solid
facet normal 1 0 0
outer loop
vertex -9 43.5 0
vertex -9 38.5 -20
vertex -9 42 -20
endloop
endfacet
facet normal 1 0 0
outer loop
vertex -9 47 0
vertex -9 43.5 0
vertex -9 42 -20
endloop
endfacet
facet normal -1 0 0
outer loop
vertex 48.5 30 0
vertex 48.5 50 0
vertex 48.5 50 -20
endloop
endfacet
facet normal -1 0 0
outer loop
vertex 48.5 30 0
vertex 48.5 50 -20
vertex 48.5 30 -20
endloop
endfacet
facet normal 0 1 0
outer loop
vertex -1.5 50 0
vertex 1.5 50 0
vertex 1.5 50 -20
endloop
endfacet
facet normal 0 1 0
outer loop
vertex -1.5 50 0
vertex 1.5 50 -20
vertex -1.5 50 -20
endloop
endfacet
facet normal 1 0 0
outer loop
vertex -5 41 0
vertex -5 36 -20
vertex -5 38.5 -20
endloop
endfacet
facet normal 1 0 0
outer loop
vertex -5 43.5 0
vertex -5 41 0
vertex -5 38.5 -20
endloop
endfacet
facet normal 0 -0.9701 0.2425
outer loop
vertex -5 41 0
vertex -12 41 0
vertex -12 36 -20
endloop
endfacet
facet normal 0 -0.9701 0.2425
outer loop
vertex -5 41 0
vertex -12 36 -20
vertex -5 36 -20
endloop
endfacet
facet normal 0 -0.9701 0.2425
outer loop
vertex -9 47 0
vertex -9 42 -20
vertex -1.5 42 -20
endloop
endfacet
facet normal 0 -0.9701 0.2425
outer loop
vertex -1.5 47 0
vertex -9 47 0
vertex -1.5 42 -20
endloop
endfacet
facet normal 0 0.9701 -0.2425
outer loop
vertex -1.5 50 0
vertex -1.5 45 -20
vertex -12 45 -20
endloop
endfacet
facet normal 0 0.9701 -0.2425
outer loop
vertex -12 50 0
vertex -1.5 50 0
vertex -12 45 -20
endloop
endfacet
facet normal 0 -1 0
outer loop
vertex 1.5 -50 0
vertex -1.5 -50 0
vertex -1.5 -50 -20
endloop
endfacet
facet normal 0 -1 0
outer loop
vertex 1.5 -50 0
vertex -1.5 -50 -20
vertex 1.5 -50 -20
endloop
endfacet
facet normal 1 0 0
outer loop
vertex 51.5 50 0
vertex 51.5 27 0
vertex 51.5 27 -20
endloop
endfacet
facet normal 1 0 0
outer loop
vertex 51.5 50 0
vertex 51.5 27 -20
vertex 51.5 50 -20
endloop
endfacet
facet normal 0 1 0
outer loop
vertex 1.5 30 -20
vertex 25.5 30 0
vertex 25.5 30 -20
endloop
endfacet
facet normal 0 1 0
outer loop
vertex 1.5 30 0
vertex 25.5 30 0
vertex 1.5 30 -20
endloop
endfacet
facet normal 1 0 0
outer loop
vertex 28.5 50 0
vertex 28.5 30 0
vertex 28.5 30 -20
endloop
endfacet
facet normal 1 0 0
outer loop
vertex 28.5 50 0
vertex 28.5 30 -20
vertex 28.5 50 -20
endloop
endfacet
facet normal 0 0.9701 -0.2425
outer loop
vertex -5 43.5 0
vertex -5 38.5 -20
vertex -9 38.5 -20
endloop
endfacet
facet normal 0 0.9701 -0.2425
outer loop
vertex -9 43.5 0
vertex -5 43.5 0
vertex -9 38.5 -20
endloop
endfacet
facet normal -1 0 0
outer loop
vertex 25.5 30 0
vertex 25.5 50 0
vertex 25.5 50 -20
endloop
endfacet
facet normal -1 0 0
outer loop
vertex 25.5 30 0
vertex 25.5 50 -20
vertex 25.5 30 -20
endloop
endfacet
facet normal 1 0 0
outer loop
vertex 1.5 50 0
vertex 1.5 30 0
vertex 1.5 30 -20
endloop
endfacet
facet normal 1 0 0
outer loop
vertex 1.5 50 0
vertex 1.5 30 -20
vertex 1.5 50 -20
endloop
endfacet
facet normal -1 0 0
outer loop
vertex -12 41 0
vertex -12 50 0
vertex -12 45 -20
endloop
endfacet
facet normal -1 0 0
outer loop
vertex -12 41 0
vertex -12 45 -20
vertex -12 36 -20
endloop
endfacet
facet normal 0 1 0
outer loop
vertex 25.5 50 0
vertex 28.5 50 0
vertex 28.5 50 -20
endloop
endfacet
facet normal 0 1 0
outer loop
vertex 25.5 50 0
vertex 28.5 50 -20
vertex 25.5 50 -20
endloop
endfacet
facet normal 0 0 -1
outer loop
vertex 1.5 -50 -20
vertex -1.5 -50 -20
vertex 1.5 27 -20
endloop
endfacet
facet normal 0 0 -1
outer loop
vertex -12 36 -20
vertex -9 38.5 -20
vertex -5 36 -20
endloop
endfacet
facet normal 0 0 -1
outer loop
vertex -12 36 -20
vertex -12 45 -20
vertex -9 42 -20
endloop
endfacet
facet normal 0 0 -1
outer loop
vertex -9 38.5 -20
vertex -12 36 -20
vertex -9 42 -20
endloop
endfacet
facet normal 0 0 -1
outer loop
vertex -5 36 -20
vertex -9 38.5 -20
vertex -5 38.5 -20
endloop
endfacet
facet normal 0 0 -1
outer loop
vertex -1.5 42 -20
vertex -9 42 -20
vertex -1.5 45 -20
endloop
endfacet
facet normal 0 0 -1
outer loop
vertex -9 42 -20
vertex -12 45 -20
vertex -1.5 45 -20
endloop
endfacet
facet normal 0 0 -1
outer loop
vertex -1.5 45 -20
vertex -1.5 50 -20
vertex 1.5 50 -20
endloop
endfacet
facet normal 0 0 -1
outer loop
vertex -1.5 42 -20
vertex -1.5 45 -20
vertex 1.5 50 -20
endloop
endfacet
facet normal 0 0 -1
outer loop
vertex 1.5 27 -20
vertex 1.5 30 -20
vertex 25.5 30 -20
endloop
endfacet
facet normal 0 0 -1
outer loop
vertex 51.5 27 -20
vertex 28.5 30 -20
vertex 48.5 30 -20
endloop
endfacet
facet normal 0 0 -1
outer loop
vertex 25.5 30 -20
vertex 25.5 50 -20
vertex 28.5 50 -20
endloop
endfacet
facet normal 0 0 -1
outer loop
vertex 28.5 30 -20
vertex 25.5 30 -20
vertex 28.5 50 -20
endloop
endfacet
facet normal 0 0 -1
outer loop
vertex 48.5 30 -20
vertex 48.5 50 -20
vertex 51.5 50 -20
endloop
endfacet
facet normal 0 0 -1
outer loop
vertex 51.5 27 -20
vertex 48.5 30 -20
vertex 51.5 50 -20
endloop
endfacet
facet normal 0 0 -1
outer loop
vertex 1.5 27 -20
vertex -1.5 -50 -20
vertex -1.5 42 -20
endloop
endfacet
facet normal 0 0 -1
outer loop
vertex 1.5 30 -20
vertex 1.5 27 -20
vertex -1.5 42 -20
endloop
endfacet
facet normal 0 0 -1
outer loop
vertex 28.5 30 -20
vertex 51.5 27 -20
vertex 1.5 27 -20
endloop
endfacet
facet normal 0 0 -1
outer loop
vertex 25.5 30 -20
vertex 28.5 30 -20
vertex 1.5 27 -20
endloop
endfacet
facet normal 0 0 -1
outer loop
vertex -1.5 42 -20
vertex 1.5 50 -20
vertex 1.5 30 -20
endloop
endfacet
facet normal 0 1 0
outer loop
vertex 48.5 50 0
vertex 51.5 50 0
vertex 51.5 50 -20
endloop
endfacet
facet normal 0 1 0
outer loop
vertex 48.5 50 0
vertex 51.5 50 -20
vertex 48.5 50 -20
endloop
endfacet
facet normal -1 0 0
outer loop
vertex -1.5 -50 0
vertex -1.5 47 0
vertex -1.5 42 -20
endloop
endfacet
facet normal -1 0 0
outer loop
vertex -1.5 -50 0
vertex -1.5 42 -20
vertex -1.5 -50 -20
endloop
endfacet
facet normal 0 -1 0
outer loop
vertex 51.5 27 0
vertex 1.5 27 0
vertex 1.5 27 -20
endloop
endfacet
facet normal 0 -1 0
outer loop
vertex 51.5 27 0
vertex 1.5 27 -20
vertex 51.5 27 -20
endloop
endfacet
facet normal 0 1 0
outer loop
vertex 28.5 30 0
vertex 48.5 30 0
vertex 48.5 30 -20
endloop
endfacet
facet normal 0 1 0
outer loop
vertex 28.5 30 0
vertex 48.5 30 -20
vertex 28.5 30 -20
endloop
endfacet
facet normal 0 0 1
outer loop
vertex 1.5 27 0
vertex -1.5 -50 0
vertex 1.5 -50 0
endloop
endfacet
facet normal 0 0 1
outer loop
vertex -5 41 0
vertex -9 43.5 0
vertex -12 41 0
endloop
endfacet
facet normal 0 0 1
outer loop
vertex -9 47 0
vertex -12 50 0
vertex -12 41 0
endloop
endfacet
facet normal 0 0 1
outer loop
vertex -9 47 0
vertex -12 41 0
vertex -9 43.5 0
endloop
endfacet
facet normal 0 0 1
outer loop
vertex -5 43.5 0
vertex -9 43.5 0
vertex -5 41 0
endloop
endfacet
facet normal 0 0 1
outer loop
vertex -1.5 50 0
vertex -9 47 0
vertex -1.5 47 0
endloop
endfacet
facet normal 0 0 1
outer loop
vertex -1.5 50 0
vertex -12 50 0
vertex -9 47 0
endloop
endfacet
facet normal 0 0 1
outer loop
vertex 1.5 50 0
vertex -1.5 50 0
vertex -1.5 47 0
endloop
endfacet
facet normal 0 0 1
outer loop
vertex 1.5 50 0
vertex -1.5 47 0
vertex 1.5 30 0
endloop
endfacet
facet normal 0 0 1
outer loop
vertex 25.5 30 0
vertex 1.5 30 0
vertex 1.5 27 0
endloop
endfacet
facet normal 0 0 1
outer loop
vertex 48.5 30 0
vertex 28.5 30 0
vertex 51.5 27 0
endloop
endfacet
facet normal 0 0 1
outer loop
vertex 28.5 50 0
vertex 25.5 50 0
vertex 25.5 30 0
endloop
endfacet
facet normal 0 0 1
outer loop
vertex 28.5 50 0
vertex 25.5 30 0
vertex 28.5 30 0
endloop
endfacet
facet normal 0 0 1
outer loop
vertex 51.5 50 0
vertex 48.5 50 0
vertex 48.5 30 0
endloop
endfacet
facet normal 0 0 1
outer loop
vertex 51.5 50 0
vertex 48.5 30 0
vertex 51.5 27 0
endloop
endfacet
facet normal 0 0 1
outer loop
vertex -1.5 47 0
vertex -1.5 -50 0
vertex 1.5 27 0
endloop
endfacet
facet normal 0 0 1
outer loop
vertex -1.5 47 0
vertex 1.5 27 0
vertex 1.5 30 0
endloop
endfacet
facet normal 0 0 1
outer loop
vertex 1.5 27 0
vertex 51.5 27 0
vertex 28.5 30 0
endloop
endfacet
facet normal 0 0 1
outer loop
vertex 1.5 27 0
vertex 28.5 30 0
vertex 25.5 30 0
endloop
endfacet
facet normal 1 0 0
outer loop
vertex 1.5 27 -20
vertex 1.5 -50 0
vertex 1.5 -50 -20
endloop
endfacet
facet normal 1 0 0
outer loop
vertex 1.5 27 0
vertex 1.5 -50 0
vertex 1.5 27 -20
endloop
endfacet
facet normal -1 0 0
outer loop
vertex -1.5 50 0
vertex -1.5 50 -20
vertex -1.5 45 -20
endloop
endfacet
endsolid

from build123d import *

# Parameters (mm, degrees)
F1_DEPTH = 20


with BuildPart() as f1:
    # F0 (on Top) → F1 (new body)
    with BuildSketch(Plane.XY):
        Polygon((1.5, 50), (-1.5, 50), (-1.5, 47), (-1.5, -50), (1.5, -50), (1.5, 27), (51.5, 27), (51.5, 30), (51.5, 50), (48.5, 50), (48.5, 30), (28.5, 30), (28.5, 50), (25.5, 50), (25.5, 30), (1.5, 30), align=None)
    extrude(amount=-F1_DEPTH)

    # F3: sweep along a path in F2
    with BuildLine(Plane(origin=(-1.5, 0, 0), x_dir=(0, -1, 0), z_dir=(-1, 0, 0))) as f3_path:
        Line((-48.5, 0), (-43.5, -20))
    # F0 (on Top) → F3 (sweep)
    with BuildSketch(Plane.XY):
        Polygon((-1.5, 47), (-1.5, 50), (-12, 50), (-12, 47), (-12, 41), (-9, 41), (-5, 41), (-5, 43.5), (-9, 43.5), (-9, 47), align=None)
    sweep(path=f3_path.line)


solid = f1.part
